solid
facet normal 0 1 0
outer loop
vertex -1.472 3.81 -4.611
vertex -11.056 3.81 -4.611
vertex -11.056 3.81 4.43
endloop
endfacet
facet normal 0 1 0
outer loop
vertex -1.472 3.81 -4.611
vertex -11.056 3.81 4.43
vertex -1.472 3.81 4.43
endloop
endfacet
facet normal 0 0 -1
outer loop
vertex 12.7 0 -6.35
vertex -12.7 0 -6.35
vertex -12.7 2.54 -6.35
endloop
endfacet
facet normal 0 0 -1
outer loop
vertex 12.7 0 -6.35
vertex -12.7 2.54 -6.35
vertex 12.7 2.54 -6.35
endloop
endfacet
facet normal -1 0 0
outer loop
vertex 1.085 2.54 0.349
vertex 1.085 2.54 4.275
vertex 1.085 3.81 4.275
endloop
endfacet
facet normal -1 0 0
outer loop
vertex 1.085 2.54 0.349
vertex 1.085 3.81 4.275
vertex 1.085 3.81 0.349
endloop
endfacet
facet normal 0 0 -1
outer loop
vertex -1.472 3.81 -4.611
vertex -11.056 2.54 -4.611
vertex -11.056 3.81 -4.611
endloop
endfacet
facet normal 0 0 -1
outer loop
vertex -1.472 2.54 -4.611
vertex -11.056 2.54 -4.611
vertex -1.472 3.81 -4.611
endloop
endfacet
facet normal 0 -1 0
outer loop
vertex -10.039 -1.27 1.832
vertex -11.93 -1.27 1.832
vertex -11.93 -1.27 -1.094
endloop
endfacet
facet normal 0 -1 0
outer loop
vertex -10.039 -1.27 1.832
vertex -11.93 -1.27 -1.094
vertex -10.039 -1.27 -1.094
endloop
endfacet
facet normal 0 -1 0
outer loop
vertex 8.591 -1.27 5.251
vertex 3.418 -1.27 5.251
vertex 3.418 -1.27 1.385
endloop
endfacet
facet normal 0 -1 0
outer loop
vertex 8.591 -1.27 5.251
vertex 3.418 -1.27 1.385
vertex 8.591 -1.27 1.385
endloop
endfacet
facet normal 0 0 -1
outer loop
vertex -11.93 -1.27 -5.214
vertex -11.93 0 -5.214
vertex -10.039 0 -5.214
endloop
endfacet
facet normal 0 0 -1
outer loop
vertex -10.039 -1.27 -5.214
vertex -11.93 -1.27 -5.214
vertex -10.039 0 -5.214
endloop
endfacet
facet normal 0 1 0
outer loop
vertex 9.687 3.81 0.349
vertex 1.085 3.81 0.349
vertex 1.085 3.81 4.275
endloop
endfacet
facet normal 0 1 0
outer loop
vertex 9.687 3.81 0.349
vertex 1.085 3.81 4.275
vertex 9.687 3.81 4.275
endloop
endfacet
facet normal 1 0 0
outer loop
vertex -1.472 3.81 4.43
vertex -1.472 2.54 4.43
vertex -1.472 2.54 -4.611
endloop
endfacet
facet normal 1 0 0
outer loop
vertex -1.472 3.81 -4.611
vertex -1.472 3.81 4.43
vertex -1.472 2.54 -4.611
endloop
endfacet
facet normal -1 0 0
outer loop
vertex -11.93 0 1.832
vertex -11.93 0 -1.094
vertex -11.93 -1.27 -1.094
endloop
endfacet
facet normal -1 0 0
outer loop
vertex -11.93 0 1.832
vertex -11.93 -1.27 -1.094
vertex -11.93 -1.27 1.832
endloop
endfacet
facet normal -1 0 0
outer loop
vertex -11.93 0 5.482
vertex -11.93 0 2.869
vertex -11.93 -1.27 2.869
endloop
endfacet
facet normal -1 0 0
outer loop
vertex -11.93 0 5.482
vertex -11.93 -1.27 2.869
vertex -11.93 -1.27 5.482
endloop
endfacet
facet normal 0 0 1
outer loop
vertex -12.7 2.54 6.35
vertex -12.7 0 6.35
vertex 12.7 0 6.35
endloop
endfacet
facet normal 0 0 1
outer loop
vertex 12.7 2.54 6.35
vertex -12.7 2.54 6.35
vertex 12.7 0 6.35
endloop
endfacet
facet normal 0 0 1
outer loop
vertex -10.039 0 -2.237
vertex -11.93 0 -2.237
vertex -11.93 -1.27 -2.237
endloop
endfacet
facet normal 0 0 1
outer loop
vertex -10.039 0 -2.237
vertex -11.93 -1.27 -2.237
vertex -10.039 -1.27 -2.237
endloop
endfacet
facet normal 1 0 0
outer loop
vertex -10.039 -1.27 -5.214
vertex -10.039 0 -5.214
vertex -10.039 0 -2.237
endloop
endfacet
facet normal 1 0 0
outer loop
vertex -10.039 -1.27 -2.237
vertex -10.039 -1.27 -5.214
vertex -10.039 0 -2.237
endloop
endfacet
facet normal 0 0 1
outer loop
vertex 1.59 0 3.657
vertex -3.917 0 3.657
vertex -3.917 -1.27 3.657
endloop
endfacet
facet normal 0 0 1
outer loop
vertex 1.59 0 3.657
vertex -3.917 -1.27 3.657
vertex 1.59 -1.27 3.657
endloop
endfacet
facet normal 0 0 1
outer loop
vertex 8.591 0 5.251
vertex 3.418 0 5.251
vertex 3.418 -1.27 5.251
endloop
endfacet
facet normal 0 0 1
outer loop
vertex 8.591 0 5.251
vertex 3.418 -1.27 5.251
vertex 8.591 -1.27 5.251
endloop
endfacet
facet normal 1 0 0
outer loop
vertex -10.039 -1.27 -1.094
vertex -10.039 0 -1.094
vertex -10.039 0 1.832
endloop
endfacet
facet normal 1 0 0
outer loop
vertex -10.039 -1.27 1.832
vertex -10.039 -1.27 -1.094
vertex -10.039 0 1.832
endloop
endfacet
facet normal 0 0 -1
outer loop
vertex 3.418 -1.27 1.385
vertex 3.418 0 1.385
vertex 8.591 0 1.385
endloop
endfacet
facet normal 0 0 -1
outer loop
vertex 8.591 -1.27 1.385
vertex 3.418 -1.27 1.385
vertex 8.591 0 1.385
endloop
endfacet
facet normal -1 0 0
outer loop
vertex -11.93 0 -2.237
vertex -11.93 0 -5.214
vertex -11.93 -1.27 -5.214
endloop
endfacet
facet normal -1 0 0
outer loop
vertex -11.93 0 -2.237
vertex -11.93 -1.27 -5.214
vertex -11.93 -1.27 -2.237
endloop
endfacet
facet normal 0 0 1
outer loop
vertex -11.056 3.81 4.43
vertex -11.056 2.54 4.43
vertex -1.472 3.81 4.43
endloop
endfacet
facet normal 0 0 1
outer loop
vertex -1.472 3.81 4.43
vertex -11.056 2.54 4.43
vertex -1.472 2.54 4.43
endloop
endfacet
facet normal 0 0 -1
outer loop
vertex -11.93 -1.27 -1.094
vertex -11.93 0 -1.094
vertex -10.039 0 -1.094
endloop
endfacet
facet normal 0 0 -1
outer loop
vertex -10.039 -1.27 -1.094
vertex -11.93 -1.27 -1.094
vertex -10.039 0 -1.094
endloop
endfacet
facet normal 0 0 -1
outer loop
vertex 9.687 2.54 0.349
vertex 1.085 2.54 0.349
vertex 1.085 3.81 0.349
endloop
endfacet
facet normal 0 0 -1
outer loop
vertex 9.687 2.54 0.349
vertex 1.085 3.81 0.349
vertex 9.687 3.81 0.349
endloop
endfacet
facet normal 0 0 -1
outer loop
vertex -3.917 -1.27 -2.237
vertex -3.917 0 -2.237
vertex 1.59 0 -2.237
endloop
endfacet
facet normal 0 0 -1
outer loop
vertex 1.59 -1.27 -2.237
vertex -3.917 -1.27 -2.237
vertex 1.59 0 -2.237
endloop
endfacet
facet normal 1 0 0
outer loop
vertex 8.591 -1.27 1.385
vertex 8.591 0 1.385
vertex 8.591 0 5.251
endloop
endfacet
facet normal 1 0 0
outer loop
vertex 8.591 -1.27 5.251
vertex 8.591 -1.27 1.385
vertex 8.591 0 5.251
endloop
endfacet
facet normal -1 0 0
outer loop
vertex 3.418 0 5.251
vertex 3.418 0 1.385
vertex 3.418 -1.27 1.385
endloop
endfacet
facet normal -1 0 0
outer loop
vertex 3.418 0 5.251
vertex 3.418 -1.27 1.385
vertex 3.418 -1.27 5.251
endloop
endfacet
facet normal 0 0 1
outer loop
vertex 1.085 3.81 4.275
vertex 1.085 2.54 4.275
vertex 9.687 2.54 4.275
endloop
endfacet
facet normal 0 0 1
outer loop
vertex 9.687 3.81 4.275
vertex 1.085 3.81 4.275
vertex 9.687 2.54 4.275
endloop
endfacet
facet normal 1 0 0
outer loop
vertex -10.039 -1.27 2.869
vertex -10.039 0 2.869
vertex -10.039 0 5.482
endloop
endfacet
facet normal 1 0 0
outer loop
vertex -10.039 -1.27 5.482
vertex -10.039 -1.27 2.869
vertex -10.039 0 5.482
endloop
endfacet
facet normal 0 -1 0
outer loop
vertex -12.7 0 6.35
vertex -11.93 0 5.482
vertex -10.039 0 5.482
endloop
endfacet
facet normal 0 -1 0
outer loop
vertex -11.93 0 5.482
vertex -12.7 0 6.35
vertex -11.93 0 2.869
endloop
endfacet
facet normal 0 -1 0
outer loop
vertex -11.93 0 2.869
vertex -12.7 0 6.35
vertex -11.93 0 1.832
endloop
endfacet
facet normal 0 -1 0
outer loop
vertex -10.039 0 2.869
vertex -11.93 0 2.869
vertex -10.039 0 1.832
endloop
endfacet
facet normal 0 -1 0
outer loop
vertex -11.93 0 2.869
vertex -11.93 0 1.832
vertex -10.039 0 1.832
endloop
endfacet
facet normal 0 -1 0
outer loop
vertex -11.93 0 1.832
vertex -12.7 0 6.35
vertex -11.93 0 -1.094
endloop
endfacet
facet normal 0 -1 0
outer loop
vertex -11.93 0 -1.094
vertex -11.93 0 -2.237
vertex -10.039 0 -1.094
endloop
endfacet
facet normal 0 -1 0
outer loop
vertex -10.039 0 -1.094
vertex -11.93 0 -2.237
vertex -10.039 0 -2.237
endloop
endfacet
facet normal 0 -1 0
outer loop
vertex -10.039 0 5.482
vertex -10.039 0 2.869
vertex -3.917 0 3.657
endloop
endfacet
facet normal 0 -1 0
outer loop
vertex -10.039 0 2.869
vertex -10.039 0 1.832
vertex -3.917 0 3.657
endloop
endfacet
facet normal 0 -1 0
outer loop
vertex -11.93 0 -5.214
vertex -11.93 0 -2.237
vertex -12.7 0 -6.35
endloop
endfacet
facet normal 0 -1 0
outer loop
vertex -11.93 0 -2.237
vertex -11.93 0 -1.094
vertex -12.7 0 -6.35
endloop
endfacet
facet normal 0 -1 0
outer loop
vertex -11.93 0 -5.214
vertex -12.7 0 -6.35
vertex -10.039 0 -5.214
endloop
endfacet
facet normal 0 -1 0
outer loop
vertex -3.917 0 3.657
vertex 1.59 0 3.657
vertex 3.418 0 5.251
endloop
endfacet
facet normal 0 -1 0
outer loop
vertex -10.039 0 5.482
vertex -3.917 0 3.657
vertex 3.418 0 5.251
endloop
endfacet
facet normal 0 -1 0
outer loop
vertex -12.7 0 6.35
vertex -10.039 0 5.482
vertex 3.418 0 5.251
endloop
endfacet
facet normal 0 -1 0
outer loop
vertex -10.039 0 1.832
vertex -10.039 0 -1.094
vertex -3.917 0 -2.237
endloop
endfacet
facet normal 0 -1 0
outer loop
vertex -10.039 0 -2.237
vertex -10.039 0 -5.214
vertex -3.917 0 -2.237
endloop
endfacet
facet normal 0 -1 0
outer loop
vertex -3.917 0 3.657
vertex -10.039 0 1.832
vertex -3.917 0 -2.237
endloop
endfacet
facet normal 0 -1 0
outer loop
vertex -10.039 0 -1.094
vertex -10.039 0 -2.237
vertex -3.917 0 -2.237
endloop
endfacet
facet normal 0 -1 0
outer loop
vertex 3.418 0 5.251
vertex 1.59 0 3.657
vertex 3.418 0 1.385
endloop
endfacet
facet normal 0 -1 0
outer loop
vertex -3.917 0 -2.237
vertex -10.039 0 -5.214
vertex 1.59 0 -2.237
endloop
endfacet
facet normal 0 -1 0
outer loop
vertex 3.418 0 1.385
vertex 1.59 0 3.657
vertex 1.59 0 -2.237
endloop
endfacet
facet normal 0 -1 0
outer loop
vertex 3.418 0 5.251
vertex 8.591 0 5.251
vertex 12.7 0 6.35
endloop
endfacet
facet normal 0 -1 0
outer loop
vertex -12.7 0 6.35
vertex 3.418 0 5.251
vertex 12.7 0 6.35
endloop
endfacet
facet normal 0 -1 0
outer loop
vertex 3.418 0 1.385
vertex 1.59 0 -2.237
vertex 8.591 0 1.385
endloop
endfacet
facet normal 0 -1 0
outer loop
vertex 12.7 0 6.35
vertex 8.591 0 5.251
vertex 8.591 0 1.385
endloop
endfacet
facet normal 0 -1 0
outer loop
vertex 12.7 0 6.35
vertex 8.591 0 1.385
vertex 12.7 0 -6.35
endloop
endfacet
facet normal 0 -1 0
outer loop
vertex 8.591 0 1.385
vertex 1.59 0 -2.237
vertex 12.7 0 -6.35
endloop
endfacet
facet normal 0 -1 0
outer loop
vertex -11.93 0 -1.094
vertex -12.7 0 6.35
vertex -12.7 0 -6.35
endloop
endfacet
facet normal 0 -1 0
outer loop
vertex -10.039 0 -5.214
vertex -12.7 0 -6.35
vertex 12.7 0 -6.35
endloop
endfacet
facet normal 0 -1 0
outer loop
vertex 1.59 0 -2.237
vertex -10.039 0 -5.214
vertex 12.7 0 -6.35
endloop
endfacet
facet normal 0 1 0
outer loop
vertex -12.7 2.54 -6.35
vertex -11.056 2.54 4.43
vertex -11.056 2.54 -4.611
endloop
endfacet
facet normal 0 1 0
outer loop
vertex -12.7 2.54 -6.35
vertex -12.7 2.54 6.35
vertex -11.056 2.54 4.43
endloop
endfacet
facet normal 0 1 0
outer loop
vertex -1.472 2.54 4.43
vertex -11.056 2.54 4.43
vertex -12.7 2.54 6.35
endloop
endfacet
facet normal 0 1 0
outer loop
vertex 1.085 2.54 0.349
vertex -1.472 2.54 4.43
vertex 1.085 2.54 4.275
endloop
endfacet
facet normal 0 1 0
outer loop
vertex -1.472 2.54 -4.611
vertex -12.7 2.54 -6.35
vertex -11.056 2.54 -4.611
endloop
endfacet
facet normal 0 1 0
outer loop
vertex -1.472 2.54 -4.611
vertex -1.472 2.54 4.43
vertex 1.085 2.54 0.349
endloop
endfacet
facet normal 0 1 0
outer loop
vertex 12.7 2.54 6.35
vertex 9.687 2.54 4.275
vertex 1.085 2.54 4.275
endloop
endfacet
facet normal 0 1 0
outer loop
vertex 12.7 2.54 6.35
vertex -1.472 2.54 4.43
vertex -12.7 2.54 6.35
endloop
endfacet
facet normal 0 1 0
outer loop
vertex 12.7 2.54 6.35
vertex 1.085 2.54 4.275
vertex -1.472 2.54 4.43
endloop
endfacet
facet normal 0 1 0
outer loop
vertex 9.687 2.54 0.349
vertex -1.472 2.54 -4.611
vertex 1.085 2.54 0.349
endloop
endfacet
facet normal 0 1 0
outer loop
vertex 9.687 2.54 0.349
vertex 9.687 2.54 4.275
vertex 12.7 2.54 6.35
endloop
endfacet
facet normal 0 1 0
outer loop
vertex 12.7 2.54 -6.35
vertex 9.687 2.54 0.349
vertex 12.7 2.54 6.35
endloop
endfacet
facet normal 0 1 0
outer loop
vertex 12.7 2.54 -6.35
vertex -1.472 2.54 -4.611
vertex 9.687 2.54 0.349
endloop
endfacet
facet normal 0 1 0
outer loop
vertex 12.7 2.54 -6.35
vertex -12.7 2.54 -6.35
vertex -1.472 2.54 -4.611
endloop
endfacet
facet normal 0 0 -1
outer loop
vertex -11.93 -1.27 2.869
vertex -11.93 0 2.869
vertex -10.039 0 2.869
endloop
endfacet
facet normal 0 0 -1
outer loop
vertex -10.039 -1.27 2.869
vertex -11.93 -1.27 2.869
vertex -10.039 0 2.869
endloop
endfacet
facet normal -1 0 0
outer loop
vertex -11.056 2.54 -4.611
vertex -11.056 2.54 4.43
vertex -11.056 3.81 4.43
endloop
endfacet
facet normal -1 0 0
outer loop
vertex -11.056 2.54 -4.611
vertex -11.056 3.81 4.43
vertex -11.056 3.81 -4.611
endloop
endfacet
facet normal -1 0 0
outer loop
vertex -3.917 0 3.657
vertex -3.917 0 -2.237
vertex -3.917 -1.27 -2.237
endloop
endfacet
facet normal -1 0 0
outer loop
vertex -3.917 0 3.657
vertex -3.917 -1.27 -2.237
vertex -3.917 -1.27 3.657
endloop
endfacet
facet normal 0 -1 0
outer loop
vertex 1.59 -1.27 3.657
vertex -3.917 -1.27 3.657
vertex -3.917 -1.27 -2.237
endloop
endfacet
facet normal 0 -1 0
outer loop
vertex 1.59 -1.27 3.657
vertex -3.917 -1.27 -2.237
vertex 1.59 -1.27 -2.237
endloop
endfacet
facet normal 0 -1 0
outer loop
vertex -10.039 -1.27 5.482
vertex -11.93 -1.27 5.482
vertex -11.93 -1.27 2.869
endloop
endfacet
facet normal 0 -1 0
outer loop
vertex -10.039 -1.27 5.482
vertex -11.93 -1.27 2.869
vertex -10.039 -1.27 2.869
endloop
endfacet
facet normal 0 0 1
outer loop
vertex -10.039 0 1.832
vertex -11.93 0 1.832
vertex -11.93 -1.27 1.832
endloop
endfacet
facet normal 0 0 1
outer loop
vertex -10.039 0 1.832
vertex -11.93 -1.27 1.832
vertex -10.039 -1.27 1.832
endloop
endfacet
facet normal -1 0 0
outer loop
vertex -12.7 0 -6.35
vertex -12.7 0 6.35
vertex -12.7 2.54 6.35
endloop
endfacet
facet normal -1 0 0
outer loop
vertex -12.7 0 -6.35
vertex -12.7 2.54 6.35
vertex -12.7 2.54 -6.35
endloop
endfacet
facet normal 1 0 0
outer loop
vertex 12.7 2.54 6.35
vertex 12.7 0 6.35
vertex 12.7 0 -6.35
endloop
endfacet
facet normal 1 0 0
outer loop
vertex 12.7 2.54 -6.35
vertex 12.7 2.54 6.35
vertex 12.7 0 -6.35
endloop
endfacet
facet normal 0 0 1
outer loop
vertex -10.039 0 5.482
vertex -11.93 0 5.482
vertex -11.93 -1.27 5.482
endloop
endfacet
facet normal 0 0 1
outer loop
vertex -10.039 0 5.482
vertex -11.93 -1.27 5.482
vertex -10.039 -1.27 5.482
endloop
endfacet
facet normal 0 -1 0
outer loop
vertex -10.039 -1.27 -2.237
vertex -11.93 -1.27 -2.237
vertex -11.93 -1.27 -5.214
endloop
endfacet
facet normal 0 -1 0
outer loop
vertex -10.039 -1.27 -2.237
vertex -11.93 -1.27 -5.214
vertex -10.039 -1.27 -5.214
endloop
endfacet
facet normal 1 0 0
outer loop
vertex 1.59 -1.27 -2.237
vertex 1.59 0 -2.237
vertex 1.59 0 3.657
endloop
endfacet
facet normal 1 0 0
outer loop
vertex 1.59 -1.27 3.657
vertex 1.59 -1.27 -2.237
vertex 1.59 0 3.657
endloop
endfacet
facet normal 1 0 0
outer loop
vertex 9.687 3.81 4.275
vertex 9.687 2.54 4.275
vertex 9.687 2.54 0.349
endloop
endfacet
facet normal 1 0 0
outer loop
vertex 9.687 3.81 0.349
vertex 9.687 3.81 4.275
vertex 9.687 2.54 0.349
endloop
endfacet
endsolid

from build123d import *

# Parameters (mm, degrees)
SKETCH1_W           = 25.4
SKETCH1_H           = 12.7
BOSS_EXTRUDE1_DEPTH = 2.54
SKETCH2_W           = 9.583787324
SKETCH2_H           = 9.041308796
SKETCH2_W_2         = 8.602159512
SKETCH2_H_2         = 3.926511249
BOSS_EXTRUDE2_DEPTH = 1.27
SKETCH3_W           = 5.506895622
SKETCH3_H           = 5.893999151
SKETCH3_W_2         = 1.890426858
SKETCH3_H_2         = 2.97685463
SKETCH3_H_3         = 2.926527621
SKETCH3_H_4         = 2.612813109
SKETCH3_W_3         = 5.17306174
SKETCH3_H_5         = 3.865660491
BOSS_EXTRUDE3_DEPTH = 1.27


with BuildPart() as part:
    # Sketch1 → Boss-Extrude1 (new body)
    with BuildSketch(Plane(origin=(0, 0, 0), x_dir=(1, 0, 0), z_dir=(0, 1, 0))):
        Rectangle(SKETCH1_W, SKETCH1_H)
    extrude(amount=BOSS_EXTRUDE1_DEPTH)

    # Sketch2 → Boss-Extrude2 (add)
    with BuildSketch(Plane(origin=(0, 2.54, 0), x_dir=(1, 0, 0), z_dir=(0, 1, 0))):
        with Locations((-6.26433538, 0.090413088)):
            Rectangle(SKETCH2_W, SKETCH2_H)
        with Locations((5.386036811, -2.311991821)):
            Rectangle(SKETCH2_W_2, SKETCH2_H_2)
    extrude(amount=BOSS_EXTRUDE2_DEPTH)

    # Sketch3 → Boss-Extrude3 (add)
    with BuildSketch(Plane.XZ):
        with Locations((-1.163587027, 0.709784011)):
            Rectangle(SKETCH3_W, SKETCH3_H)
        with Locations((-10.984373833, -3.72564288)):
            Rectangle(SKETCH3_W_2, SKETCH3_H_2)
        with Locations((-10.984373833, 0.369096396)):
            Rectangle(SKETCH3_W_2, SKETCH3_H_3)
        with Locations((-10.984373833, 4.175284666)):
            Rectangle(SKETCH3_W_2, SKETCH3_H_4)
        with Locations((6.004852016, 3.317890469)):
            Rectangle(SKETCH3_W_3, SKETCH3_H_5)
    extrude(amount=BOSS_EXTRUDE3_DEPTH)


solid = part.part
